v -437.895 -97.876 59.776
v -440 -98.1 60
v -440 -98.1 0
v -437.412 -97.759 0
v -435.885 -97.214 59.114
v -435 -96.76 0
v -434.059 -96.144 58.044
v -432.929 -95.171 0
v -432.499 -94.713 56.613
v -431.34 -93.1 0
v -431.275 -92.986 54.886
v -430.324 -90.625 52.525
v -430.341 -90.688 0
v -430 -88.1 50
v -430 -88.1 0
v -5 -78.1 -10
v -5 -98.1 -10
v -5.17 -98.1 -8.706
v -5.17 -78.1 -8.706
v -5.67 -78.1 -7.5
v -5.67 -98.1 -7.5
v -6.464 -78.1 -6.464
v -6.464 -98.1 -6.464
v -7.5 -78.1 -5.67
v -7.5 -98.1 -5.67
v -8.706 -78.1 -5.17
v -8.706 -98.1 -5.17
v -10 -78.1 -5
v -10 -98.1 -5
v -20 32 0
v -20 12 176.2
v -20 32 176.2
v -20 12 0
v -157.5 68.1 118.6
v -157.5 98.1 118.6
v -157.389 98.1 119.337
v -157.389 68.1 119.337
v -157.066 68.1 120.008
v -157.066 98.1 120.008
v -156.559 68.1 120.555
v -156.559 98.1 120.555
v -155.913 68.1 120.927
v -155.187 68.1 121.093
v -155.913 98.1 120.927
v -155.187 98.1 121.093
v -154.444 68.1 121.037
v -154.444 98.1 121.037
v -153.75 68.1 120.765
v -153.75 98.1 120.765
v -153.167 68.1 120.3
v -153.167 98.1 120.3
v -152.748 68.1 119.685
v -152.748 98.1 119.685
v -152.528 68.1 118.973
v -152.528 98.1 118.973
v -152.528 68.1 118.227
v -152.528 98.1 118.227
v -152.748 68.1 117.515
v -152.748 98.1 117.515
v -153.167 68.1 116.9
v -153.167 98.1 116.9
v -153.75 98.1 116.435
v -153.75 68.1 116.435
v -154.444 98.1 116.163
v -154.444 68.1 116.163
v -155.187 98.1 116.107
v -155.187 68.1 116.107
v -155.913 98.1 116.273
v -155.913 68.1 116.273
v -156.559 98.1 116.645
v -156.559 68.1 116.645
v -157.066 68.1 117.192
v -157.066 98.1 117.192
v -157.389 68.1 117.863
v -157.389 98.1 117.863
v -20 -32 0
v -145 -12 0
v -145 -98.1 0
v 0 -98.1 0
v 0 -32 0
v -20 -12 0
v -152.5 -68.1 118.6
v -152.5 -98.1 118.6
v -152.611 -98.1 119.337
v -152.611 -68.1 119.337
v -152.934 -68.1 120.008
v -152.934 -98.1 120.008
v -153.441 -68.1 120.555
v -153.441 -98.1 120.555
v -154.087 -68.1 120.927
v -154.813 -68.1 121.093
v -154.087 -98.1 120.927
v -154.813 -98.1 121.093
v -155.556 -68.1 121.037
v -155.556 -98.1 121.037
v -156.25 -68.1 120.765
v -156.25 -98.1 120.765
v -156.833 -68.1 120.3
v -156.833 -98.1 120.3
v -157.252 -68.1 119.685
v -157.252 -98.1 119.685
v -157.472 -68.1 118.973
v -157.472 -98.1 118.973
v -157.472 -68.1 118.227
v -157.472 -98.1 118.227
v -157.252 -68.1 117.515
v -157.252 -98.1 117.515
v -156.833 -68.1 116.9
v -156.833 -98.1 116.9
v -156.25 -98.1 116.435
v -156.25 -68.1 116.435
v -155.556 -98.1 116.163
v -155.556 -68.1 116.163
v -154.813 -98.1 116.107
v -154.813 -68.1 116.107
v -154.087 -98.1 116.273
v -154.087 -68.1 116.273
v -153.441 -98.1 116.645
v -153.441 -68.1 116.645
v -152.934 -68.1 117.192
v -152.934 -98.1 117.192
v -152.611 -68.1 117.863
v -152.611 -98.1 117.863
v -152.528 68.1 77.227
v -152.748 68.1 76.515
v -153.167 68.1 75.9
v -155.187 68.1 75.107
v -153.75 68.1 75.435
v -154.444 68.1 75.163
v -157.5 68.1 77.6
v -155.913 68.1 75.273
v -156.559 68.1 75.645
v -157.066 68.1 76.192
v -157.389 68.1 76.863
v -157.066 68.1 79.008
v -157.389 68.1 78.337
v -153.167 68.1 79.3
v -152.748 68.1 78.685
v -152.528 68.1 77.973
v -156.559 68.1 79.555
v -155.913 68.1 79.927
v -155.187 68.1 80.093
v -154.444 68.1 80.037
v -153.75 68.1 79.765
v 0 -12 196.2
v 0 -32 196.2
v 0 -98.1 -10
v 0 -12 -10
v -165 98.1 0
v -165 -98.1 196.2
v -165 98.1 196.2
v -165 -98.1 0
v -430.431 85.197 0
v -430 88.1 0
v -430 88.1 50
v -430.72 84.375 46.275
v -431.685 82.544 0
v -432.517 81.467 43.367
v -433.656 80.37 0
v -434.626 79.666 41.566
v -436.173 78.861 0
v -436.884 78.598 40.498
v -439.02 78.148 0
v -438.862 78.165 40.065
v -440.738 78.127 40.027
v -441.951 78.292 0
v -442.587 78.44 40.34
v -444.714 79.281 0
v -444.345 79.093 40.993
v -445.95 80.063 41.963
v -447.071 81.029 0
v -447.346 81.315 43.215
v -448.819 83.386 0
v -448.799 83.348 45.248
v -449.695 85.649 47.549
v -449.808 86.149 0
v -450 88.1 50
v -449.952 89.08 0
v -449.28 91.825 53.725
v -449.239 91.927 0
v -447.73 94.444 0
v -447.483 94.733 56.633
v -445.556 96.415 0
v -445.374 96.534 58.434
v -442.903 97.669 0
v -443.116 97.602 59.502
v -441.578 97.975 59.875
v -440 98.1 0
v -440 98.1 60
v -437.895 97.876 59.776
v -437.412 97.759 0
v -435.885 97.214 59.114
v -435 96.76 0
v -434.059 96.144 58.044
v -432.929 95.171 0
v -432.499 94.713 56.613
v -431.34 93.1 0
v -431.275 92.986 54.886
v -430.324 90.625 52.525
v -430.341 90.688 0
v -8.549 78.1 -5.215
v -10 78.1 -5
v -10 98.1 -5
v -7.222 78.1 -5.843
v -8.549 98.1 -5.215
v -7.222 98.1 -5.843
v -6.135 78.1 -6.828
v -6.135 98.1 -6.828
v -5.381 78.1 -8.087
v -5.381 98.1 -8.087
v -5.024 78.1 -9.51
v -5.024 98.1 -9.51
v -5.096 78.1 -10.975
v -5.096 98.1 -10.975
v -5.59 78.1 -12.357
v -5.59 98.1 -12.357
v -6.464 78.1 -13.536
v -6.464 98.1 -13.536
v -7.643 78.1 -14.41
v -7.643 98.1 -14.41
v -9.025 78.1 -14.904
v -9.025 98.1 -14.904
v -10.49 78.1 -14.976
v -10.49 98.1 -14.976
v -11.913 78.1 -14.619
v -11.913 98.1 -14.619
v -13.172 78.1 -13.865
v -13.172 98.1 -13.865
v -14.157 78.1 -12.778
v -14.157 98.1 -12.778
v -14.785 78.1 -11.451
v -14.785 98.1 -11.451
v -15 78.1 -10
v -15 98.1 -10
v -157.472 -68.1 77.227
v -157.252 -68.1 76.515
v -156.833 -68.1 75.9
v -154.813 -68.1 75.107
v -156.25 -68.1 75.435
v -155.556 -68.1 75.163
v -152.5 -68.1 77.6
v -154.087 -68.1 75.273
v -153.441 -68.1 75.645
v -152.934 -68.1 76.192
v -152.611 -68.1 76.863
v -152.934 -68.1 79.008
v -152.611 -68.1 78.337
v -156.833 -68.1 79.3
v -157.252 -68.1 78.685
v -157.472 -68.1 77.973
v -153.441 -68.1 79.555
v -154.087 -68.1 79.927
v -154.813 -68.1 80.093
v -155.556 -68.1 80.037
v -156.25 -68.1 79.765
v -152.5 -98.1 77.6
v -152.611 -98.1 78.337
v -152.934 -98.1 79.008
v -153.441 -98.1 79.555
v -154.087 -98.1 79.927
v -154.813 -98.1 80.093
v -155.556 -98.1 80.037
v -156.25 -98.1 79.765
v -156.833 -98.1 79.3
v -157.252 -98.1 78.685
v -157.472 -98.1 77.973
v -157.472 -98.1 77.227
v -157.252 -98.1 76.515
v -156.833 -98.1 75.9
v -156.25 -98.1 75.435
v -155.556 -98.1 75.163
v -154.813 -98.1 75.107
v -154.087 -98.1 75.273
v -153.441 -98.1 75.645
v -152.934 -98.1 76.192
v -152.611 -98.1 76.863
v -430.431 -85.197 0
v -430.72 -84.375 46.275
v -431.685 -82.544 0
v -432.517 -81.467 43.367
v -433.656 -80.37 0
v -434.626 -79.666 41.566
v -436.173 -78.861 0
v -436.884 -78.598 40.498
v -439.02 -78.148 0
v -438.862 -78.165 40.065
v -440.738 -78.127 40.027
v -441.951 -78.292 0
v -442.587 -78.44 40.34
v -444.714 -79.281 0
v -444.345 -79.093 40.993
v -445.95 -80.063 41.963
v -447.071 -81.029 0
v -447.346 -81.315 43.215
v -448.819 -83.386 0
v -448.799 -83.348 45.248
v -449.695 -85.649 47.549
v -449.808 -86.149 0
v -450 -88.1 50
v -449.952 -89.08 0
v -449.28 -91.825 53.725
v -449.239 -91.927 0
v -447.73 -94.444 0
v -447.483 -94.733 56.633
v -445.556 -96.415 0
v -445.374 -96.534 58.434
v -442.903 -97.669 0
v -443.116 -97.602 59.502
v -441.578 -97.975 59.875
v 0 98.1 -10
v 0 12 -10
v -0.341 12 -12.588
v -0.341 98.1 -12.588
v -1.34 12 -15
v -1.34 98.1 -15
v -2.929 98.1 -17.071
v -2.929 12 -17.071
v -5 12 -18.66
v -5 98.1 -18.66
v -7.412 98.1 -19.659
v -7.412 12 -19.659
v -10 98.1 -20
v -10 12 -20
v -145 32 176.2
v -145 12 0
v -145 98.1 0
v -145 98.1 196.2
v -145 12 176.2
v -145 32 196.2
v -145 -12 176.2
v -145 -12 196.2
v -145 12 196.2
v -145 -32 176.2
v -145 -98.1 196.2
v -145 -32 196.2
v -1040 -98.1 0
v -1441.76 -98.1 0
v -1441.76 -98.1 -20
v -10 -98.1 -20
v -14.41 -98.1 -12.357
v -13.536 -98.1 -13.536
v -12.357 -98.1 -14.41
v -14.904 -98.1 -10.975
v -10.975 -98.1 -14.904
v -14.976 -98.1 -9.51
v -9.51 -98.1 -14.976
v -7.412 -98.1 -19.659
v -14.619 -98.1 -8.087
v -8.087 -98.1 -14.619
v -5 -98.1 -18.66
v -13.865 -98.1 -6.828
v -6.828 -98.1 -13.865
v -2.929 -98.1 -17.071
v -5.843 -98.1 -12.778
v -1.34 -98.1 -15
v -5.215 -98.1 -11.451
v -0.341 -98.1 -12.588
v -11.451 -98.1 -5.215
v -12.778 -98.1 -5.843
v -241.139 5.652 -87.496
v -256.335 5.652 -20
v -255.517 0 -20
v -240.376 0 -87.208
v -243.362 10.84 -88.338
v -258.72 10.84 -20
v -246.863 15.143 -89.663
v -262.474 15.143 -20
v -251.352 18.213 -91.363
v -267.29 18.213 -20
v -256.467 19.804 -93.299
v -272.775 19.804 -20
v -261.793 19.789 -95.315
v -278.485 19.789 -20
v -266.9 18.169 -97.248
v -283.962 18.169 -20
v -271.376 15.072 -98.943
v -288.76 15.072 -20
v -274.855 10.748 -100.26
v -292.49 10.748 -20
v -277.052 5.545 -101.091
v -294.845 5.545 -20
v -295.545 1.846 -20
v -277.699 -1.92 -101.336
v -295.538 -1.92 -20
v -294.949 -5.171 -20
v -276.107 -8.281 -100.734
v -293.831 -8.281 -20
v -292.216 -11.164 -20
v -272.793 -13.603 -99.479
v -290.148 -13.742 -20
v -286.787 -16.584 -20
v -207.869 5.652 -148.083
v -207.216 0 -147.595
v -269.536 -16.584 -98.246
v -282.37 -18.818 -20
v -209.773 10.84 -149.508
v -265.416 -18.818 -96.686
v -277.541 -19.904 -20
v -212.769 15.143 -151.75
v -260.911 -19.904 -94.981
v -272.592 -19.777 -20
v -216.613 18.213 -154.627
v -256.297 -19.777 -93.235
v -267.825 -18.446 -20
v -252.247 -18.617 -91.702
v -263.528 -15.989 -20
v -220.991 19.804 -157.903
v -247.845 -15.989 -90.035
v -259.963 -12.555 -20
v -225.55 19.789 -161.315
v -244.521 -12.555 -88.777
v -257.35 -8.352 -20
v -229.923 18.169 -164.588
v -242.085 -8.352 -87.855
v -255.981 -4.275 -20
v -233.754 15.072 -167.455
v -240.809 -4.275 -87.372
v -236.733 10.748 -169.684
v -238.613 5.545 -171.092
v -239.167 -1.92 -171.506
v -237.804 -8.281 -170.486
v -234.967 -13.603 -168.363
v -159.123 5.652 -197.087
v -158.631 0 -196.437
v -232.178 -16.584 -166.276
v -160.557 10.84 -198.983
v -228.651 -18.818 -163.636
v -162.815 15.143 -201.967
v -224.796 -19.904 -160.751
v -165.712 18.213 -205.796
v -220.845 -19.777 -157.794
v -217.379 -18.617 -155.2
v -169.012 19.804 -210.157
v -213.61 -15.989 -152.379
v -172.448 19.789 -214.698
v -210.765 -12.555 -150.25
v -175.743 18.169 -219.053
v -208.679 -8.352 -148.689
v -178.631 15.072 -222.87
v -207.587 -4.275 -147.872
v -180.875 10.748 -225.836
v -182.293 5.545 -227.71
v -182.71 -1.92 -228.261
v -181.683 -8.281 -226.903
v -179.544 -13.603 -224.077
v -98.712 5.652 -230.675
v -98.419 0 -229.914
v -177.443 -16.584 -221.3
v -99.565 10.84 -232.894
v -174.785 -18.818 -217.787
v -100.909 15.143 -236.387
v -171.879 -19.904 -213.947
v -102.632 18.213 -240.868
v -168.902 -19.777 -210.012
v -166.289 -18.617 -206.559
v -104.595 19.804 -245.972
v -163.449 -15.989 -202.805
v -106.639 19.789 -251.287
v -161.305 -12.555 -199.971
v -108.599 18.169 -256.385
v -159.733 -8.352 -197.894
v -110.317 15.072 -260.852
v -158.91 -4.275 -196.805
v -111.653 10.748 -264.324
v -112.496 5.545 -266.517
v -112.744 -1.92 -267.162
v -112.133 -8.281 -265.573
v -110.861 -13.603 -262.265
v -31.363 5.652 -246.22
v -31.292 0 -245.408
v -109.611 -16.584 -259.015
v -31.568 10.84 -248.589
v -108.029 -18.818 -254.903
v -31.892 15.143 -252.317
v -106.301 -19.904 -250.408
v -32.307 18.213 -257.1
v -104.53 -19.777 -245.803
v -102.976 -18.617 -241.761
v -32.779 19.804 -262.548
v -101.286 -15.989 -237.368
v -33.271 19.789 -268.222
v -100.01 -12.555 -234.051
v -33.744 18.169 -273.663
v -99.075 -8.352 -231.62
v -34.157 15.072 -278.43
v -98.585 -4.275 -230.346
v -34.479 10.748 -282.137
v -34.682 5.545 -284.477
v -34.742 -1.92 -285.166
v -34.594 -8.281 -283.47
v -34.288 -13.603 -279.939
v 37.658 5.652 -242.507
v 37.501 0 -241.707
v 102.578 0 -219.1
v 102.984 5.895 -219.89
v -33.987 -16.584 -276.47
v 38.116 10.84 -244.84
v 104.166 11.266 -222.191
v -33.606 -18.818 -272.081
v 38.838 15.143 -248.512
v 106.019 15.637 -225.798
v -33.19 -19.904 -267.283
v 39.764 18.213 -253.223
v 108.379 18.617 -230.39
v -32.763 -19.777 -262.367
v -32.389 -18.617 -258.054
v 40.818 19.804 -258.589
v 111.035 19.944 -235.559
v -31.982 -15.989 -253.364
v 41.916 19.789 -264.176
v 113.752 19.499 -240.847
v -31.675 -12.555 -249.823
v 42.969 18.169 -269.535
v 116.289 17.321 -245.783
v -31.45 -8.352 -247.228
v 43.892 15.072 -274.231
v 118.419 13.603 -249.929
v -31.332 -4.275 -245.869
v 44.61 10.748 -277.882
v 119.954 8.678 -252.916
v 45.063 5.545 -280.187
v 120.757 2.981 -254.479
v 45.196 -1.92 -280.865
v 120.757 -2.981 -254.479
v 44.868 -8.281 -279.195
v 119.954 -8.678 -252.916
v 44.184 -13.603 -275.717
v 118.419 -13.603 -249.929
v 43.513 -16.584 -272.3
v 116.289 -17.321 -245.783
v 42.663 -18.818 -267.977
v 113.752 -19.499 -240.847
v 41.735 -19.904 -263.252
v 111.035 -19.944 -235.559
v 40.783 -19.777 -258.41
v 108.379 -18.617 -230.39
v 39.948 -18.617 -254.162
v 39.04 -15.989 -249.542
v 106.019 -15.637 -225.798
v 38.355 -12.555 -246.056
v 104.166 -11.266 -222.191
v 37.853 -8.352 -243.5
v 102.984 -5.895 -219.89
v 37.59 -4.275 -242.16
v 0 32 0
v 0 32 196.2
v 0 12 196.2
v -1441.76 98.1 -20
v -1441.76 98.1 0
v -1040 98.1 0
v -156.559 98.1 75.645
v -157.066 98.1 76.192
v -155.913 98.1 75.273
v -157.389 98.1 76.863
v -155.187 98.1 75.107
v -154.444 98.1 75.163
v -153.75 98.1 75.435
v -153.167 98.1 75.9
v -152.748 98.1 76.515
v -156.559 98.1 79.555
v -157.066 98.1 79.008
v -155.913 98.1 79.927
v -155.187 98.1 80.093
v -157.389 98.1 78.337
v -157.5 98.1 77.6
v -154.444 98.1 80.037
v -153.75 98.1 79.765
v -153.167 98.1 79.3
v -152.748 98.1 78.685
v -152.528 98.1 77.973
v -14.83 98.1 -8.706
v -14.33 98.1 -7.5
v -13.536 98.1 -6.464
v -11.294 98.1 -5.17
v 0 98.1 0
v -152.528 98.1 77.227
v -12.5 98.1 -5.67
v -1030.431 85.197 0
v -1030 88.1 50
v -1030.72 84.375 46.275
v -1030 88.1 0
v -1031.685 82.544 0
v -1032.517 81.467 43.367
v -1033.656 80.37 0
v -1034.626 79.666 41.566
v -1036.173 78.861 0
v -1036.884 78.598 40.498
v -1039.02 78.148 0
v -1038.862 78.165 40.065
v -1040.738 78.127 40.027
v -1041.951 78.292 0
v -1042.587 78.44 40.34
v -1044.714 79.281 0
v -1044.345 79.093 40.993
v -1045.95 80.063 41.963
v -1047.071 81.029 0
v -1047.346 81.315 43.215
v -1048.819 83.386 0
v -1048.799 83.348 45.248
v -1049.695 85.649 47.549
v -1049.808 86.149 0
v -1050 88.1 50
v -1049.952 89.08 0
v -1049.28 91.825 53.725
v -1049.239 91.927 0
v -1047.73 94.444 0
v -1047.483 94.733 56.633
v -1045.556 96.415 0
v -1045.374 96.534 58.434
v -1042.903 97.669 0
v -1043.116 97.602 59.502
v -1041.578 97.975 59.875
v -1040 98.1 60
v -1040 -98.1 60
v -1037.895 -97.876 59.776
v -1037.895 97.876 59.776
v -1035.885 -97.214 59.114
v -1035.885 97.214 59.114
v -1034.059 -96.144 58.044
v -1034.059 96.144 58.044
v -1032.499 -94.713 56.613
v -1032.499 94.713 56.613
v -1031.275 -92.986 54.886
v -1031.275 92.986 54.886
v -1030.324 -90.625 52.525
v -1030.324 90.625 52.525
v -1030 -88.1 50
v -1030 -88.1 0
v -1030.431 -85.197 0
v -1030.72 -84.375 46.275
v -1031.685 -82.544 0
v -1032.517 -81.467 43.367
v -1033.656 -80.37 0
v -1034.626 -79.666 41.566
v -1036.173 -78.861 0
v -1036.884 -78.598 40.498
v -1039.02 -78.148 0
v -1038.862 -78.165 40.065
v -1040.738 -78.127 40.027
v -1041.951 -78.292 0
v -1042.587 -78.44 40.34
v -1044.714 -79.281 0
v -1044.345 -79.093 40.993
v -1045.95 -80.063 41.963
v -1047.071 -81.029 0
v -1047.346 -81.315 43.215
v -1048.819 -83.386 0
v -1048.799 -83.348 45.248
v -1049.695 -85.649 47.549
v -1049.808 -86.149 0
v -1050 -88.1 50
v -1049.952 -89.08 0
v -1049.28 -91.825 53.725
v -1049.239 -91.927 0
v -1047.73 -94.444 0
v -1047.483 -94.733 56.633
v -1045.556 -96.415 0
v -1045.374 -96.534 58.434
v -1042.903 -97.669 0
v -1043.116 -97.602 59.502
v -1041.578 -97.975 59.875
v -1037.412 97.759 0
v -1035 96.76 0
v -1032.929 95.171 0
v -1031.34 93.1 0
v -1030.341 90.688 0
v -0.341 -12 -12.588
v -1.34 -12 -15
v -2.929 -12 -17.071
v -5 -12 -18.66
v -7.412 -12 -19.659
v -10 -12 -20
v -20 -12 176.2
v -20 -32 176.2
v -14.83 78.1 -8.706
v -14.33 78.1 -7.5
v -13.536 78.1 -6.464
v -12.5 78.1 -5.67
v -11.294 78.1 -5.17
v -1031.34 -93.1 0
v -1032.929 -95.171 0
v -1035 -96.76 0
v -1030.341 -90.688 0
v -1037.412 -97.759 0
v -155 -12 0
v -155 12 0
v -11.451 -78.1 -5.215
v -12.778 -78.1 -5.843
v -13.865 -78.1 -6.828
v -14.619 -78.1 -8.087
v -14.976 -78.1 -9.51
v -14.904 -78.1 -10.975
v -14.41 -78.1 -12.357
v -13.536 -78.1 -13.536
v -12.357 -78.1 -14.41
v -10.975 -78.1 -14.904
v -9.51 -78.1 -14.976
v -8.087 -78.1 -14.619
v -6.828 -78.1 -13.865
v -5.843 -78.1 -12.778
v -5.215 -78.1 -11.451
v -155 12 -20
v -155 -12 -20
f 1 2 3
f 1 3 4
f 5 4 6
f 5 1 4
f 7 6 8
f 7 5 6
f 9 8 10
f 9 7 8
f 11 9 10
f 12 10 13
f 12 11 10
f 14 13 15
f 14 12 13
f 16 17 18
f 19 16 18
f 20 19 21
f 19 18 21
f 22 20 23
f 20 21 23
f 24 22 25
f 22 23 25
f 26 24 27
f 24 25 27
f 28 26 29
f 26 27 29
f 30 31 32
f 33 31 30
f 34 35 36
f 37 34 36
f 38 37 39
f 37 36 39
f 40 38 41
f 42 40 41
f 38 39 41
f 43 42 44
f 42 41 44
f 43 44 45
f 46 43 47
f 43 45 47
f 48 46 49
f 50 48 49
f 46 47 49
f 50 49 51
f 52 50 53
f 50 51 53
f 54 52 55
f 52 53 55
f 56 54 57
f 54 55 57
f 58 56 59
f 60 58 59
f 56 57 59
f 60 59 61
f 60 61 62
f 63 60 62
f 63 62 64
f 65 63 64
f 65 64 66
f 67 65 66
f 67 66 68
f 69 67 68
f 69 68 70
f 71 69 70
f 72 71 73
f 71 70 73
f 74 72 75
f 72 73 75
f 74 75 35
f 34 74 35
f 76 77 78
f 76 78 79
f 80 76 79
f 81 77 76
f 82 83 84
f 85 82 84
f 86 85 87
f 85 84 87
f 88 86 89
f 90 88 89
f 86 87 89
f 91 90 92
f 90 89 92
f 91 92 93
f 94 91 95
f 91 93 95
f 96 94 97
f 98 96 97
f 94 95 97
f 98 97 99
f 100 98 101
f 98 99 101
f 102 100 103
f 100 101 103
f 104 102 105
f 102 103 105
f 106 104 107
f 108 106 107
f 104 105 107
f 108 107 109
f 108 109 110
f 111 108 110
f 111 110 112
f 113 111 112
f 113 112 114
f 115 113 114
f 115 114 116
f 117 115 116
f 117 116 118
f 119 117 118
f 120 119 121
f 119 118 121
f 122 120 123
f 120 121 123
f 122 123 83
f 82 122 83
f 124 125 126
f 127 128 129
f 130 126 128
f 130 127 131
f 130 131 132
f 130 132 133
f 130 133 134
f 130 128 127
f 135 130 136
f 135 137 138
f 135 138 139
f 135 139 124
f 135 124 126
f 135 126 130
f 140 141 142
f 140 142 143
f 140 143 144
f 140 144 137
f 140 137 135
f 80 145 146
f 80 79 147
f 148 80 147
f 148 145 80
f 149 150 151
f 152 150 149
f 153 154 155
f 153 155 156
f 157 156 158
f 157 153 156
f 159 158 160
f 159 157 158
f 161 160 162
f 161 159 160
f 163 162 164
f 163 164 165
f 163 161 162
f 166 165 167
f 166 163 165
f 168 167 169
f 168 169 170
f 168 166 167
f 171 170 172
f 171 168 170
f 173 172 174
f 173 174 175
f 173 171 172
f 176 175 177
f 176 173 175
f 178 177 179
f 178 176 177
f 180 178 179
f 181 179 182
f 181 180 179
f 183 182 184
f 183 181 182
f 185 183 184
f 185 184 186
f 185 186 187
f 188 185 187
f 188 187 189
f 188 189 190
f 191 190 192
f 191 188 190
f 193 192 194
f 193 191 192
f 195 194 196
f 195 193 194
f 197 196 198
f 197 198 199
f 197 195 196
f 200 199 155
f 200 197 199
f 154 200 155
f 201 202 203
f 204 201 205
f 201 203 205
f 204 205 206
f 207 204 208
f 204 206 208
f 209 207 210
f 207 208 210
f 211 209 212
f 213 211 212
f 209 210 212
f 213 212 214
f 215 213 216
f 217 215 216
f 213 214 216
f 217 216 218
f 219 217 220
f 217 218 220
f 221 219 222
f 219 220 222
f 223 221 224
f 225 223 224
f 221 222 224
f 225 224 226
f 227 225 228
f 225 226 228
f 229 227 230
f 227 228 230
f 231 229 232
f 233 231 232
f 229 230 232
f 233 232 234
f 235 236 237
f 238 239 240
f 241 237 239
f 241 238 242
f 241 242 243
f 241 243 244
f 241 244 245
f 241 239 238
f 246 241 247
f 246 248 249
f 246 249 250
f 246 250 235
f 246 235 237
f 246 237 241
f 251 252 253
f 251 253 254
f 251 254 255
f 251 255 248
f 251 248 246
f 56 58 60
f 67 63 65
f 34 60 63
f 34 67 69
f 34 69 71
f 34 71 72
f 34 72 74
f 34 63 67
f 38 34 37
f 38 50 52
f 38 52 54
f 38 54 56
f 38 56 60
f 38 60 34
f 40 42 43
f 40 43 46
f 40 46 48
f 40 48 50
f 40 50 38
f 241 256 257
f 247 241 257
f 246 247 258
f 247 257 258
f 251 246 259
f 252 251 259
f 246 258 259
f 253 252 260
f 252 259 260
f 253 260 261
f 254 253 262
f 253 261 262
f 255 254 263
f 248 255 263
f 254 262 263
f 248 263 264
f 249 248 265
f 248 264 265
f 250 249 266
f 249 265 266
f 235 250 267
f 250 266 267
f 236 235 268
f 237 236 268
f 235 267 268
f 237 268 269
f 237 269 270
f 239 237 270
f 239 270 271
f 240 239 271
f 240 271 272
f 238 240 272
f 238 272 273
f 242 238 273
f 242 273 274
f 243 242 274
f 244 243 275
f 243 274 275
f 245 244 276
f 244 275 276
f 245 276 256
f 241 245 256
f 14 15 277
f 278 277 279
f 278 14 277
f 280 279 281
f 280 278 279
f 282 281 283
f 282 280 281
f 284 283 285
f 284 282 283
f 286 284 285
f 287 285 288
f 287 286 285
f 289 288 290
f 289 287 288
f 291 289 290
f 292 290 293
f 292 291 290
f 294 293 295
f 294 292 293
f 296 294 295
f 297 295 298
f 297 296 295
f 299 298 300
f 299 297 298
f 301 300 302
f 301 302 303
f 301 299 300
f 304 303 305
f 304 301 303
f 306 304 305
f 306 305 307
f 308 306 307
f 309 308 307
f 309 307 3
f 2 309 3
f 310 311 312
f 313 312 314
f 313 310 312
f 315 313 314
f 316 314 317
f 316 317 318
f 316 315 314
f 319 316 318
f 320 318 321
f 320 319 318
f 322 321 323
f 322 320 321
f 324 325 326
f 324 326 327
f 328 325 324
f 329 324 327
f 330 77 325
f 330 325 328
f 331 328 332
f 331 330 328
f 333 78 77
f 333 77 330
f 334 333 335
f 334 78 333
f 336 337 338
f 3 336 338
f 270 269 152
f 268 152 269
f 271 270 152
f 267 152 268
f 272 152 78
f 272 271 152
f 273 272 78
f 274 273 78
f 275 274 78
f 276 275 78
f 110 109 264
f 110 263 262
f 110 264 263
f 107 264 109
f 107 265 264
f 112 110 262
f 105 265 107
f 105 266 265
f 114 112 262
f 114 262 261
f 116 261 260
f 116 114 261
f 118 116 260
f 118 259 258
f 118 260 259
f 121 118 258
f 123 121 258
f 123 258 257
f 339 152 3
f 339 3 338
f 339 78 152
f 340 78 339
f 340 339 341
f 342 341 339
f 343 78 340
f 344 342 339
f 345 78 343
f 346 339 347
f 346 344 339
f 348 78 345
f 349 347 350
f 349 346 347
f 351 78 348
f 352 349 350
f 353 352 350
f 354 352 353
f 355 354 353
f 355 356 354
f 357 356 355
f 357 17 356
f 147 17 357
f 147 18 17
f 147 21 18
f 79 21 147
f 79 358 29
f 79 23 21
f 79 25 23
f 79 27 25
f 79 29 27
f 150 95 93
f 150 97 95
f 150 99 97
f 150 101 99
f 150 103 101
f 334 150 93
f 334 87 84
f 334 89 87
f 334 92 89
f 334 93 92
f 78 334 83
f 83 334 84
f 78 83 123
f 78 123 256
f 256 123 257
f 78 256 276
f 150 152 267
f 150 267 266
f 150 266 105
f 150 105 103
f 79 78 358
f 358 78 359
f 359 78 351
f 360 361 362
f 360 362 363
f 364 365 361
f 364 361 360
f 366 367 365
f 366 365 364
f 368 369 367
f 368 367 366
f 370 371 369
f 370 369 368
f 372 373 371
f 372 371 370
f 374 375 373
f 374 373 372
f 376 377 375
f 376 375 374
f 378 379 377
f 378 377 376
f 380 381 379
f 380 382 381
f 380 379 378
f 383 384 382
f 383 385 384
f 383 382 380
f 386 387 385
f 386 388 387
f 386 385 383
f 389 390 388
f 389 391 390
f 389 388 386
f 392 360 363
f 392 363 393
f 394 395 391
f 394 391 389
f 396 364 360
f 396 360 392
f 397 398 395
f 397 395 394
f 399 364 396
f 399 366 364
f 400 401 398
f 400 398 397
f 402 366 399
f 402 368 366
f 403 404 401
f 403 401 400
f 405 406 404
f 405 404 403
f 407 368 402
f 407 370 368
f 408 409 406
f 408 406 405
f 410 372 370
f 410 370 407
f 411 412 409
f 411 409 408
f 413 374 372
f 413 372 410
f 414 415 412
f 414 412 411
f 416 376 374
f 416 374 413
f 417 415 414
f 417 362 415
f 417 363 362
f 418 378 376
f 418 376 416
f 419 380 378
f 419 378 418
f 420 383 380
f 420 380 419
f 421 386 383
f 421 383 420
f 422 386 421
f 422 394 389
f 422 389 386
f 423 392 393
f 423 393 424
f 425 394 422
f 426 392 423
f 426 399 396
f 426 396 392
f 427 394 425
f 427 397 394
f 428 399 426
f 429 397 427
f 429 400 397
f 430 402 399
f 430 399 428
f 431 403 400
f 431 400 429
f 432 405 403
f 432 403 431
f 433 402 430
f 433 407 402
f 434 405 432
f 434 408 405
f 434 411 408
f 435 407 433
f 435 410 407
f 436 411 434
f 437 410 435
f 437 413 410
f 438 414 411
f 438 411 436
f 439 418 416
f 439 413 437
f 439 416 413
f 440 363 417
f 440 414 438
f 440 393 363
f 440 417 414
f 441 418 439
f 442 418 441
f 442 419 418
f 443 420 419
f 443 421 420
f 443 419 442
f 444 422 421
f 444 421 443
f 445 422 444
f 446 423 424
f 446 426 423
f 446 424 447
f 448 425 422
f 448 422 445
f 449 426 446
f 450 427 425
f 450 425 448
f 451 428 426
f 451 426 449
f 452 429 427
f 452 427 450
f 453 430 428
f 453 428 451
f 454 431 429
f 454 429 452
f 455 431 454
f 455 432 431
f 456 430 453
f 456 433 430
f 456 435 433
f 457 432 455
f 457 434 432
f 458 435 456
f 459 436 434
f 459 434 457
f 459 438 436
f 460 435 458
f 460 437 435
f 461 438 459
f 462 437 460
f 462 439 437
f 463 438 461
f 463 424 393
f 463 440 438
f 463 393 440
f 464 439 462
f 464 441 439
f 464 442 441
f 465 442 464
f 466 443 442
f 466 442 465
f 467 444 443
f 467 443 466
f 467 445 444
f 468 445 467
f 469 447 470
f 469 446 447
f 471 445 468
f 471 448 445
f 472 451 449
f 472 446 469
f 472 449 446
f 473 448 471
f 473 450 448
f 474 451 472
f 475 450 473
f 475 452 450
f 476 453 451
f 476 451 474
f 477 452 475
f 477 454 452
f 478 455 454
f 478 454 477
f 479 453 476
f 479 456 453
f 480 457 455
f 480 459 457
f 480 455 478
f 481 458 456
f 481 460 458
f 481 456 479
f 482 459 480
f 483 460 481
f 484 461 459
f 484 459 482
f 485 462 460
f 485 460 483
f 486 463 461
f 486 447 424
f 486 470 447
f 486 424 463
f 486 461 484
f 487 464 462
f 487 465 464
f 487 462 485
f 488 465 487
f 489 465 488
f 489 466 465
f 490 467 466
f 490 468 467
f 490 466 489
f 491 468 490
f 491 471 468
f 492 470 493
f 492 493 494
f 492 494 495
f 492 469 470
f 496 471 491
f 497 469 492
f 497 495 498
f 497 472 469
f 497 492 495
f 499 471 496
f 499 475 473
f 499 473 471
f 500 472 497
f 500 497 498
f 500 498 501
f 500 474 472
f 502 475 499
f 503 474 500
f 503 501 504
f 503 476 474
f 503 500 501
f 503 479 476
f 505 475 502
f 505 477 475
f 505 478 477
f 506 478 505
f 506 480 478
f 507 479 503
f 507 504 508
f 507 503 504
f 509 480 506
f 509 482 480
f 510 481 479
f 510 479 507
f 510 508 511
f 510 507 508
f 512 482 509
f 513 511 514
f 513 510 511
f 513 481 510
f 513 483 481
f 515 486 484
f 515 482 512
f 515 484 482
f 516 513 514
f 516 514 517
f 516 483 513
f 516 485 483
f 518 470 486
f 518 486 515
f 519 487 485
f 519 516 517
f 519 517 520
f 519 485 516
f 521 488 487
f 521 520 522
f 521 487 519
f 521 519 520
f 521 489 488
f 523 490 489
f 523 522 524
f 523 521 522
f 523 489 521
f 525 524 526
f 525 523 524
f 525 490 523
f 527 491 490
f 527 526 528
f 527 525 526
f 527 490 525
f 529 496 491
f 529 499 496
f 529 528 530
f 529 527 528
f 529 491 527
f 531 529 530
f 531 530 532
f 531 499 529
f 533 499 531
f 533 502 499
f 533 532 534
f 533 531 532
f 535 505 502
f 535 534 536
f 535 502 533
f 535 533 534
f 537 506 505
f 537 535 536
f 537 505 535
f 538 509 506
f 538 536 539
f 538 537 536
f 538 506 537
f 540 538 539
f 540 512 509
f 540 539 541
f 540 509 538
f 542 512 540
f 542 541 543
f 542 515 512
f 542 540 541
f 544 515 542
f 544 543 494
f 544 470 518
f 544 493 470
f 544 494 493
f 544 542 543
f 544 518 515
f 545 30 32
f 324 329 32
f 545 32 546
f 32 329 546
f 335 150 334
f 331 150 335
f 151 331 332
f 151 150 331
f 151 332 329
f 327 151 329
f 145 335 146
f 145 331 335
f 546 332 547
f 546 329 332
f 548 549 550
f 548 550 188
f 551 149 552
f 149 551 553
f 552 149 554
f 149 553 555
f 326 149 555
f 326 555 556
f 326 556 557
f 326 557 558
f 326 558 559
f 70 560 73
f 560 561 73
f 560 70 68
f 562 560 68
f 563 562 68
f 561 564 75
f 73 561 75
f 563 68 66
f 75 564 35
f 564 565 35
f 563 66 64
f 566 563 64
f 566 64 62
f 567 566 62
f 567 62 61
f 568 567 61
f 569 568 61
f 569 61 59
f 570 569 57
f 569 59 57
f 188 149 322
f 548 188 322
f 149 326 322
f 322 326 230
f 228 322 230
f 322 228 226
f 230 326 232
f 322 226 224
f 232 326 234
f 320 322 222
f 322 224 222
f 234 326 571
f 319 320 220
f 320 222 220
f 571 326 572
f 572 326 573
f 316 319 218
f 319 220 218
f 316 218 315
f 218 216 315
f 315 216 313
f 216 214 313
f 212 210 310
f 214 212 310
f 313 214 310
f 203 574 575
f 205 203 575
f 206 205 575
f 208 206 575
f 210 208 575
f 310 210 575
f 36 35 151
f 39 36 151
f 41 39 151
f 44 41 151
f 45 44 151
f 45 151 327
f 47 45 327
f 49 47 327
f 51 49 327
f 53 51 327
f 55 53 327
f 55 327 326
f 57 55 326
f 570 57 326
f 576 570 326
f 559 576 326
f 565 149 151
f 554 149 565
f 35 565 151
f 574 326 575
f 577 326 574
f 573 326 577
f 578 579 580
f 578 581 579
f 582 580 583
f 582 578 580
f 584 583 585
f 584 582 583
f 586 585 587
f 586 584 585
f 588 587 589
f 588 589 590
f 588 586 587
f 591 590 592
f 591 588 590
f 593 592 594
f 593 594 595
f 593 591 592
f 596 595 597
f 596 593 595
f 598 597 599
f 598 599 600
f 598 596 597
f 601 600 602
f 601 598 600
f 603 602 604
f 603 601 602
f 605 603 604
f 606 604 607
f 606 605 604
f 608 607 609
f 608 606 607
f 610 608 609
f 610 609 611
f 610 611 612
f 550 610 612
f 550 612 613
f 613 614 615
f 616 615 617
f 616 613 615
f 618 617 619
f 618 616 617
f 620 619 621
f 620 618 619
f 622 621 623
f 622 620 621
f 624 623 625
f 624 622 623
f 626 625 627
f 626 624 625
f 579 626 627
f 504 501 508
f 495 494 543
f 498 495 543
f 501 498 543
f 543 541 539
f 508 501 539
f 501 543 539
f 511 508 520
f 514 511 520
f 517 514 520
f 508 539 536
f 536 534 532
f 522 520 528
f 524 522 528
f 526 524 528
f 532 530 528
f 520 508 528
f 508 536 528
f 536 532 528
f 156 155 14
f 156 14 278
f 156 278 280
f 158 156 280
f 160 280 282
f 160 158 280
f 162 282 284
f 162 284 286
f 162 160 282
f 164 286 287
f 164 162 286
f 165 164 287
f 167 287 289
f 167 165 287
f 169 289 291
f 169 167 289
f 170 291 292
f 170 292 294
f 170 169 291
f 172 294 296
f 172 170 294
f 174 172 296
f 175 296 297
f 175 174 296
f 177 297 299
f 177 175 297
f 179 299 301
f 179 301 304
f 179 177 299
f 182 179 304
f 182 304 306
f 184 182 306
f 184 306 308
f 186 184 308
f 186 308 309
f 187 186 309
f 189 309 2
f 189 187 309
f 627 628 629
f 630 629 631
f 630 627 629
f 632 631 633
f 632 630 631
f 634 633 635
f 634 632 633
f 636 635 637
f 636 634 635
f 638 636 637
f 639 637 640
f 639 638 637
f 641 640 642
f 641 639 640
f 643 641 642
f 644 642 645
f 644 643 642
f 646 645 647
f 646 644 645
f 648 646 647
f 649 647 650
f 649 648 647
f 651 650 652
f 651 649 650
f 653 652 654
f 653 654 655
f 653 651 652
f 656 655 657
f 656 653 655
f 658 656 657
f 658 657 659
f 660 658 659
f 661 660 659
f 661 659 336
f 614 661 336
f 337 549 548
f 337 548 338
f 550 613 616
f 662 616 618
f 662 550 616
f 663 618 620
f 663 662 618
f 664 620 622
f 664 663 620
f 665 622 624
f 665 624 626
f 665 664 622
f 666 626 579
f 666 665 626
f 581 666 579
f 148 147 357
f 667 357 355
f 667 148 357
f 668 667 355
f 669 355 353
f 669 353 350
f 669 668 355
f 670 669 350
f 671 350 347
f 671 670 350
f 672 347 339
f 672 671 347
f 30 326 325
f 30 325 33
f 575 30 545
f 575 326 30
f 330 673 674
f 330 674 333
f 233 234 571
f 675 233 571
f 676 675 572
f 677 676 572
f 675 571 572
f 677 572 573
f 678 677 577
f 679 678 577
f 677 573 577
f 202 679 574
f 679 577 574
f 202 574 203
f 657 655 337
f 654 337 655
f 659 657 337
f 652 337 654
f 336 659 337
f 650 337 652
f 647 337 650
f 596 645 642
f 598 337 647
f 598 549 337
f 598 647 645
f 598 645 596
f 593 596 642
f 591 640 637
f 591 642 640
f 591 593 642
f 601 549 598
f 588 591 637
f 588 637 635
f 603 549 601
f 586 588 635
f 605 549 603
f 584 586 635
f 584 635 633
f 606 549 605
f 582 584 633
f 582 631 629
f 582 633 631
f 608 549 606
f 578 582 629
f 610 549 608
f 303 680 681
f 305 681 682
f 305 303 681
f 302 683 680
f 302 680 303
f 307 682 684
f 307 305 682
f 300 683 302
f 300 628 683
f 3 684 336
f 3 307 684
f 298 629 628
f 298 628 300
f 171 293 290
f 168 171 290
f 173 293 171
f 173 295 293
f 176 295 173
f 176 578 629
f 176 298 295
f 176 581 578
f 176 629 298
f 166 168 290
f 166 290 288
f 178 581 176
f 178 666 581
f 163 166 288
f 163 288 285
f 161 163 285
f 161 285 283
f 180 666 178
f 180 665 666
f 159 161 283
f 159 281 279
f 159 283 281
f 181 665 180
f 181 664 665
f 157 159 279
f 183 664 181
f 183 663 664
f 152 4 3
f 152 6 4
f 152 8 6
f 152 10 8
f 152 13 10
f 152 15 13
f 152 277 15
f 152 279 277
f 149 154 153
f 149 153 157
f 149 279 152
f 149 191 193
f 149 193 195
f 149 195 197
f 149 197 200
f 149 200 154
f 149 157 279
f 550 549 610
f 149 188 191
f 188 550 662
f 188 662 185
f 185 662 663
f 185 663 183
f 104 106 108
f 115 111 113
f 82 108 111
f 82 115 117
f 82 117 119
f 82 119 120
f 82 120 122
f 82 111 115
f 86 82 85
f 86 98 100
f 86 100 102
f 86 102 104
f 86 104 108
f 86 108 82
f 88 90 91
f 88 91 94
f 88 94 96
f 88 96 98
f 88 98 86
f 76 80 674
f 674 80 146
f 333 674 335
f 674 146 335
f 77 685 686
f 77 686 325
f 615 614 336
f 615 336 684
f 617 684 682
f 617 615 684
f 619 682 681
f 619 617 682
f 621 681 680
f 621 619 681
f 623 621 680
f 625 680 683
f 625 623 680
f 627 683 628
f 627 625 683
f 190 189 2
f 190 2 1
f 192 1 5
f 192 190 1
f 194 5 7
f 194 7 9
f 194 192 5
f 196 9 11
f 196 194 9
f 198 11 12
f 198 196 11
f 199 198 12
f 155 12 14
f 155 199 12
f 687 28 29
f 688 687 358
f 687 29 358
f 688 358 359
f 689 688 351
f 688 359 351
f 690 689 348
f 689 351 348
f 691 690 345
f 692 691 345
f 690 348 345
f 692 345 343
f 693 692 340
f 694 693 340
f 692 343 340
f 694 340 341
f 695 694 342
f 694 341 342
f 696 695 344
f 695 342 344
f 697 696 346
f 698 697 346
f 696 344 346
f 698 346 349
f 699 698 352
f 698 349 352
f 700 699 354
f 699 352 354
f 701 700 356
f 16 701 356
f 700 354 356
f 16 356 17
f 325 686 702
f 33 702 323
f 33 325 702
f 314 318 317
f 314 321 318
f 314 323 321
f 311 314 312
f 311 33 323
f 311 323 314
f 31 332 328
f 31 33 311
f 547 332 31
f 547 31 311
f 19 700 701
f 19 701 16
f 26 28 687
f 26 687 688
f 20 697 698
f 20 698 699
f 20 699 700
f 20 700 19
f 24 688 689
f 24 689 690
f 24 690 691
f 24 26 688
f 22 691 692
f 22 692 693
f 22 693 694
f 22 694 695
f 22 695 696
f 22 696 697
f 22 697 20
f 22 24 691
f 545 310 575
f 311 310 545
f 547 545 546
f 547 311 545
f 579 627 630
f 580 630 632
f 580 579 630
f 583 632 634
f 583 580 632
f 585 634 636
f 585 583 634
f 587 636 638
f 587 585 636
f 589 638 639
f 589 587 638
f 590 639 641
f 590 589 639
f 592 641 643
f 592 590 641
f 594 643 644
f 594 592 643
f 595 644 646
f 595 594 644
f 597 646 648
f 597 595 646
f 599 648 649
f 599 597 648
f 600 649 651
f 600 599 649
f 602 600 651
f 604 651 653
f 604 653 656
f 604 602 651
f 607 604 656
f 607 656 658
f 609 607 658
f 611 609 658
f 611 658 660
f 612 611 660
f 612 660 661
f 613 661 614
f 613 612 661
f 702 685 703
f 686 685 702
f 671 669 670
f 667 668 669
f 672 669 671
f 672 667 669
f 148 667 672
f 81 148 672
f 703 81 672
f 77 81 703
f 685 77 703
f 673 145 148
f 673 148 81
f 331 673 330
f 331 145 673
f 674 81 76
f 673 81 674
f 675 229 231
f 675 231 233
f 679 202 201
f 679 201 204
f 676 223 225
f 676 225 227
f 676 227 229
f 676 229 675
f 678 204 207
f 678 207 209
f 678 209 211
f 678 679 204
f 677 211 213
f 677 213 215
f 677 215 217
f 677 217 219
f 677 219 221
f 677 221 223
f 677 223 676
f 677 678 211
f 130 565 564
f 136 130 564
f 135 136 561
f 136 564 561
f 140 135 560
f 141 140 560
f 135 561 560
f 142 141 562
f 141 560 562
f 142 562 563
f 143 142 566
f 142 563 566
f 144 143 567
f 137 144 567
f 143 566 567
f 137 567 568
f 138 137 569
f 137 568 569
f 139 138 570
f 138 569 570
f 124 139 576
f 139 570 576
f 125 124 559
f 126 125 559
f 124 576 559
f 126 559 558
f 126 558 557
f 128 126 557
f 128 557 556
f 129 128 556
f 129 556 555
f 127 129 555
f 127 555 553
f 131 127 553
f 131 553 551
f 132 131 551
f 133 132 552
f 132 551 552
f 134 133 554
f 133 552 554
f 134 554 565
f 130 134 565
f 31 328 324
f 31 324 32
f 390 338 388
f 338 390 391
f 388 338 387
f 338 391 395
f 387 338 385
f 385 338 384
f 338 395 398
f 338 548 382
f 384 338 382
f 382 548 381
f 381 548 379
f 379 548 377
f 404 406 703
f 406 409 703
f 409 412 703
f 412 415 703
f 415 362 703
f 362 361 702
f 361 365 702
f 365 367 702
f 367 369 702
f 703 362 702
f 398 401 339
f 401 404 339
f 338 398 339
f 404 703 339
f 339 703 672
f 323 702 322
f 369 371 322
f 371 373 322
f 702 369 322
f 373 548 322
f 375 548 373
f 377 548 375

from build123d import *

# Parameters (mm, degrees)
F1_DEPTH  = 20
F2_R      = 10
F5_R      = 20
F9_DEPTH  = 196.2
F11_R     = 2.5
F12_DEPTH = 30
F14_R     = 2.5
F15_DEPTH = 30
F18_DEPTH = 20
F21_DEPTH = 20
F23_DEPTH = 20
F26_DEPTH = 20


with BuildPart() as f1:
    # F0 (on Top) → F1 (new body)
    with BuildSketch(Plane.XY):
        Polygon((0, -98.1), (0, -12), (-155, -12), (-155, 0), (-155, 12), (0, 12), (0, 98.1), (-1441.76, 98.1), (-1441.76, -98.1), align=None)
    extrude(amount=-F1_DEPTH)

    # F2
    f2_edges = [f1.edges().sort_by_distance(p)[0] for p in [
        (0, -55.05, -20),
        (0, 55.05, -20),
    ]]
    fillet(f2_edges, radius=F2_R)

    # F6: sweep along a path in F4
    with BuildLine(Plane.XZ) as f6_path:
        ThreePointArc((-276.33, 0), (-148.7703707389, -227.3201555186), (111.7183092779, -236.8888390924))
    # F5 (on Top) → F6 (sweep)
    with BuildSketch(Plane.XY):
        with Locations((-276.33, 0)):
            Circle(F5_R)
    sweep(path=f6_path.line)

    # F8 (on offset) → F9 (join)
    with BuildSketch(Plane.XZ.offset(98.1)):
        Polygon((-155, 0), (-145, 0), (-145, 196.2), (-155, 196.2), (-165, 196.2), (-165, 0), align=None)
    extrude(amount=-F9_DEPTH)

    # F11 (on offset) → F12 (cut)
    with BuildSketch(Plane.XZ.offset(98.1)):
        with Locations((-155, 118.6)):
            Circle(F11_R)
        with Locations((-155, 77.6)):
            Circle(F11_R)
    extrude(amount=-F12_DEPTH, mode=Mode.SUBTRACT)

    # F14 (on offset) → F15 (cut)
    with BuildSketch(Plane(origin=(0, 98.1, 0), x_dir=(-1, 0, 0), z_dir=(0, 1, 0))):
        with Locations((155, 118.6)):
            Circle(F14_R)
        with Locations((155, 77.6)):
            Circle(F14_R)
    extrude(amount=-F15_DEPTH, mode=Mode.SUBTRACT)

    # F17 (on offset) → F18 (join)
    with BuildSketch(Plane.XZ.offset(-12)):
        Polygon((-20, 0), (0, 0), (0, 196.2), (-145, 196.2), (-145, 176.2), (-20, 176.2), align=None)
    extrude(amount=-F18_DEPTH)

    # F20 (on offset) → F21 (join)
    with BuildSketch(Plane(origin=(0, -12, 0), x_dir=(-1, 0, 0), z_dir=(0, 1, 0))):
        Polygon((0, 196.2), (0, 0), (20, 0), (20, 176.2), (145, 176.2), (145, 196.2), align=None)
    extrude(amount=-F21_DEPTH)

    # F22 (on offset) → F23 (cut)
    with BuildSketch(Plane.XZ.offset(98.1)):
        with BuildLine():
            ThreePointArc((-10, -5), (-13.5355339059, -13.5355339059), (-5, -10))
            ThreePointArc((-5, -10), (-6.4644660941, -6.4644660941), (-10, -5))
        make_face()
    extrude(amount=-F23_DEPTH, mode=Mode.SUBTRACT)

    # F25 (on offset) → F26 (cut)
    with BuildSketch(Plane(origin=(0, 98.1, 0), x_dir=(-1, 0, 0), z_dir=(0, 1, 0))):
        with BuildLine():
            ThreePointArc((10, -5), (6.4644660941, -13.5355339059), (15, -10))
            ThreePointArc((15, -10), (13.5355339059, -6.4644660941), (10, -5))
        make_face()
    extrude(amount=-F26_DEPTH, mode=Mode.SUBTRACT)

    # F29: sweep along a path in F28
    with BuildLine(Plane(origin=(-440, 0, 0), x_dir=(0, -1, 0), z_dir=(-1, 0, 0))) as f29_path:
        Line((88.1, 0), (88.1, 50))
        Line((88.1, 50), (-88.1, 50))
        Line((-88.1, 50), (-88.1, 0))
    # F3 (on Top) → F29 (sweep)
    with BuildSketch(Plane.XY):
        with BuildLine():
            ThreePointArc((-440, -98.1), (-432.9289321881, -95.1710678119), (-430, -88.1))
            ThreePointArc((-430, -88.1), (-447.0710678119, -81.0289321881), (-440, -98.1))
        make_face()
    sweep(path=f29_path.line, transition=Transition.RIGHT)

    # F32: sweep along a path in F31
    with BuildLine(Plane(origin=(-1040, 0, 0), x_dir=(0, -1, 0), z_dir=(-1, 0, 0))) as f32_path:
        Line((88.1, 0), (88.1, 50))
        Line((88.1, 50), (-88.1, 50))
        Line((-88.1, 50), (-88.1, 0))
    # F3 (on Top) → F32 (sweep)
    with BuildSketch(Plane.XY):
        with BuildLine():
            ThreePointArc((-1040, -98.1), (-1032.9289321881, -95.1710678119), (-1030, -88.1))
            ThreePointArc((-1030, -88.1), (-1047.0710678119, -81.0289321881), (-1040, -98.1))
        make_face()
    sweep(path=f32_path.line, transition=Transition.RIGHT)


solid = f1.part
